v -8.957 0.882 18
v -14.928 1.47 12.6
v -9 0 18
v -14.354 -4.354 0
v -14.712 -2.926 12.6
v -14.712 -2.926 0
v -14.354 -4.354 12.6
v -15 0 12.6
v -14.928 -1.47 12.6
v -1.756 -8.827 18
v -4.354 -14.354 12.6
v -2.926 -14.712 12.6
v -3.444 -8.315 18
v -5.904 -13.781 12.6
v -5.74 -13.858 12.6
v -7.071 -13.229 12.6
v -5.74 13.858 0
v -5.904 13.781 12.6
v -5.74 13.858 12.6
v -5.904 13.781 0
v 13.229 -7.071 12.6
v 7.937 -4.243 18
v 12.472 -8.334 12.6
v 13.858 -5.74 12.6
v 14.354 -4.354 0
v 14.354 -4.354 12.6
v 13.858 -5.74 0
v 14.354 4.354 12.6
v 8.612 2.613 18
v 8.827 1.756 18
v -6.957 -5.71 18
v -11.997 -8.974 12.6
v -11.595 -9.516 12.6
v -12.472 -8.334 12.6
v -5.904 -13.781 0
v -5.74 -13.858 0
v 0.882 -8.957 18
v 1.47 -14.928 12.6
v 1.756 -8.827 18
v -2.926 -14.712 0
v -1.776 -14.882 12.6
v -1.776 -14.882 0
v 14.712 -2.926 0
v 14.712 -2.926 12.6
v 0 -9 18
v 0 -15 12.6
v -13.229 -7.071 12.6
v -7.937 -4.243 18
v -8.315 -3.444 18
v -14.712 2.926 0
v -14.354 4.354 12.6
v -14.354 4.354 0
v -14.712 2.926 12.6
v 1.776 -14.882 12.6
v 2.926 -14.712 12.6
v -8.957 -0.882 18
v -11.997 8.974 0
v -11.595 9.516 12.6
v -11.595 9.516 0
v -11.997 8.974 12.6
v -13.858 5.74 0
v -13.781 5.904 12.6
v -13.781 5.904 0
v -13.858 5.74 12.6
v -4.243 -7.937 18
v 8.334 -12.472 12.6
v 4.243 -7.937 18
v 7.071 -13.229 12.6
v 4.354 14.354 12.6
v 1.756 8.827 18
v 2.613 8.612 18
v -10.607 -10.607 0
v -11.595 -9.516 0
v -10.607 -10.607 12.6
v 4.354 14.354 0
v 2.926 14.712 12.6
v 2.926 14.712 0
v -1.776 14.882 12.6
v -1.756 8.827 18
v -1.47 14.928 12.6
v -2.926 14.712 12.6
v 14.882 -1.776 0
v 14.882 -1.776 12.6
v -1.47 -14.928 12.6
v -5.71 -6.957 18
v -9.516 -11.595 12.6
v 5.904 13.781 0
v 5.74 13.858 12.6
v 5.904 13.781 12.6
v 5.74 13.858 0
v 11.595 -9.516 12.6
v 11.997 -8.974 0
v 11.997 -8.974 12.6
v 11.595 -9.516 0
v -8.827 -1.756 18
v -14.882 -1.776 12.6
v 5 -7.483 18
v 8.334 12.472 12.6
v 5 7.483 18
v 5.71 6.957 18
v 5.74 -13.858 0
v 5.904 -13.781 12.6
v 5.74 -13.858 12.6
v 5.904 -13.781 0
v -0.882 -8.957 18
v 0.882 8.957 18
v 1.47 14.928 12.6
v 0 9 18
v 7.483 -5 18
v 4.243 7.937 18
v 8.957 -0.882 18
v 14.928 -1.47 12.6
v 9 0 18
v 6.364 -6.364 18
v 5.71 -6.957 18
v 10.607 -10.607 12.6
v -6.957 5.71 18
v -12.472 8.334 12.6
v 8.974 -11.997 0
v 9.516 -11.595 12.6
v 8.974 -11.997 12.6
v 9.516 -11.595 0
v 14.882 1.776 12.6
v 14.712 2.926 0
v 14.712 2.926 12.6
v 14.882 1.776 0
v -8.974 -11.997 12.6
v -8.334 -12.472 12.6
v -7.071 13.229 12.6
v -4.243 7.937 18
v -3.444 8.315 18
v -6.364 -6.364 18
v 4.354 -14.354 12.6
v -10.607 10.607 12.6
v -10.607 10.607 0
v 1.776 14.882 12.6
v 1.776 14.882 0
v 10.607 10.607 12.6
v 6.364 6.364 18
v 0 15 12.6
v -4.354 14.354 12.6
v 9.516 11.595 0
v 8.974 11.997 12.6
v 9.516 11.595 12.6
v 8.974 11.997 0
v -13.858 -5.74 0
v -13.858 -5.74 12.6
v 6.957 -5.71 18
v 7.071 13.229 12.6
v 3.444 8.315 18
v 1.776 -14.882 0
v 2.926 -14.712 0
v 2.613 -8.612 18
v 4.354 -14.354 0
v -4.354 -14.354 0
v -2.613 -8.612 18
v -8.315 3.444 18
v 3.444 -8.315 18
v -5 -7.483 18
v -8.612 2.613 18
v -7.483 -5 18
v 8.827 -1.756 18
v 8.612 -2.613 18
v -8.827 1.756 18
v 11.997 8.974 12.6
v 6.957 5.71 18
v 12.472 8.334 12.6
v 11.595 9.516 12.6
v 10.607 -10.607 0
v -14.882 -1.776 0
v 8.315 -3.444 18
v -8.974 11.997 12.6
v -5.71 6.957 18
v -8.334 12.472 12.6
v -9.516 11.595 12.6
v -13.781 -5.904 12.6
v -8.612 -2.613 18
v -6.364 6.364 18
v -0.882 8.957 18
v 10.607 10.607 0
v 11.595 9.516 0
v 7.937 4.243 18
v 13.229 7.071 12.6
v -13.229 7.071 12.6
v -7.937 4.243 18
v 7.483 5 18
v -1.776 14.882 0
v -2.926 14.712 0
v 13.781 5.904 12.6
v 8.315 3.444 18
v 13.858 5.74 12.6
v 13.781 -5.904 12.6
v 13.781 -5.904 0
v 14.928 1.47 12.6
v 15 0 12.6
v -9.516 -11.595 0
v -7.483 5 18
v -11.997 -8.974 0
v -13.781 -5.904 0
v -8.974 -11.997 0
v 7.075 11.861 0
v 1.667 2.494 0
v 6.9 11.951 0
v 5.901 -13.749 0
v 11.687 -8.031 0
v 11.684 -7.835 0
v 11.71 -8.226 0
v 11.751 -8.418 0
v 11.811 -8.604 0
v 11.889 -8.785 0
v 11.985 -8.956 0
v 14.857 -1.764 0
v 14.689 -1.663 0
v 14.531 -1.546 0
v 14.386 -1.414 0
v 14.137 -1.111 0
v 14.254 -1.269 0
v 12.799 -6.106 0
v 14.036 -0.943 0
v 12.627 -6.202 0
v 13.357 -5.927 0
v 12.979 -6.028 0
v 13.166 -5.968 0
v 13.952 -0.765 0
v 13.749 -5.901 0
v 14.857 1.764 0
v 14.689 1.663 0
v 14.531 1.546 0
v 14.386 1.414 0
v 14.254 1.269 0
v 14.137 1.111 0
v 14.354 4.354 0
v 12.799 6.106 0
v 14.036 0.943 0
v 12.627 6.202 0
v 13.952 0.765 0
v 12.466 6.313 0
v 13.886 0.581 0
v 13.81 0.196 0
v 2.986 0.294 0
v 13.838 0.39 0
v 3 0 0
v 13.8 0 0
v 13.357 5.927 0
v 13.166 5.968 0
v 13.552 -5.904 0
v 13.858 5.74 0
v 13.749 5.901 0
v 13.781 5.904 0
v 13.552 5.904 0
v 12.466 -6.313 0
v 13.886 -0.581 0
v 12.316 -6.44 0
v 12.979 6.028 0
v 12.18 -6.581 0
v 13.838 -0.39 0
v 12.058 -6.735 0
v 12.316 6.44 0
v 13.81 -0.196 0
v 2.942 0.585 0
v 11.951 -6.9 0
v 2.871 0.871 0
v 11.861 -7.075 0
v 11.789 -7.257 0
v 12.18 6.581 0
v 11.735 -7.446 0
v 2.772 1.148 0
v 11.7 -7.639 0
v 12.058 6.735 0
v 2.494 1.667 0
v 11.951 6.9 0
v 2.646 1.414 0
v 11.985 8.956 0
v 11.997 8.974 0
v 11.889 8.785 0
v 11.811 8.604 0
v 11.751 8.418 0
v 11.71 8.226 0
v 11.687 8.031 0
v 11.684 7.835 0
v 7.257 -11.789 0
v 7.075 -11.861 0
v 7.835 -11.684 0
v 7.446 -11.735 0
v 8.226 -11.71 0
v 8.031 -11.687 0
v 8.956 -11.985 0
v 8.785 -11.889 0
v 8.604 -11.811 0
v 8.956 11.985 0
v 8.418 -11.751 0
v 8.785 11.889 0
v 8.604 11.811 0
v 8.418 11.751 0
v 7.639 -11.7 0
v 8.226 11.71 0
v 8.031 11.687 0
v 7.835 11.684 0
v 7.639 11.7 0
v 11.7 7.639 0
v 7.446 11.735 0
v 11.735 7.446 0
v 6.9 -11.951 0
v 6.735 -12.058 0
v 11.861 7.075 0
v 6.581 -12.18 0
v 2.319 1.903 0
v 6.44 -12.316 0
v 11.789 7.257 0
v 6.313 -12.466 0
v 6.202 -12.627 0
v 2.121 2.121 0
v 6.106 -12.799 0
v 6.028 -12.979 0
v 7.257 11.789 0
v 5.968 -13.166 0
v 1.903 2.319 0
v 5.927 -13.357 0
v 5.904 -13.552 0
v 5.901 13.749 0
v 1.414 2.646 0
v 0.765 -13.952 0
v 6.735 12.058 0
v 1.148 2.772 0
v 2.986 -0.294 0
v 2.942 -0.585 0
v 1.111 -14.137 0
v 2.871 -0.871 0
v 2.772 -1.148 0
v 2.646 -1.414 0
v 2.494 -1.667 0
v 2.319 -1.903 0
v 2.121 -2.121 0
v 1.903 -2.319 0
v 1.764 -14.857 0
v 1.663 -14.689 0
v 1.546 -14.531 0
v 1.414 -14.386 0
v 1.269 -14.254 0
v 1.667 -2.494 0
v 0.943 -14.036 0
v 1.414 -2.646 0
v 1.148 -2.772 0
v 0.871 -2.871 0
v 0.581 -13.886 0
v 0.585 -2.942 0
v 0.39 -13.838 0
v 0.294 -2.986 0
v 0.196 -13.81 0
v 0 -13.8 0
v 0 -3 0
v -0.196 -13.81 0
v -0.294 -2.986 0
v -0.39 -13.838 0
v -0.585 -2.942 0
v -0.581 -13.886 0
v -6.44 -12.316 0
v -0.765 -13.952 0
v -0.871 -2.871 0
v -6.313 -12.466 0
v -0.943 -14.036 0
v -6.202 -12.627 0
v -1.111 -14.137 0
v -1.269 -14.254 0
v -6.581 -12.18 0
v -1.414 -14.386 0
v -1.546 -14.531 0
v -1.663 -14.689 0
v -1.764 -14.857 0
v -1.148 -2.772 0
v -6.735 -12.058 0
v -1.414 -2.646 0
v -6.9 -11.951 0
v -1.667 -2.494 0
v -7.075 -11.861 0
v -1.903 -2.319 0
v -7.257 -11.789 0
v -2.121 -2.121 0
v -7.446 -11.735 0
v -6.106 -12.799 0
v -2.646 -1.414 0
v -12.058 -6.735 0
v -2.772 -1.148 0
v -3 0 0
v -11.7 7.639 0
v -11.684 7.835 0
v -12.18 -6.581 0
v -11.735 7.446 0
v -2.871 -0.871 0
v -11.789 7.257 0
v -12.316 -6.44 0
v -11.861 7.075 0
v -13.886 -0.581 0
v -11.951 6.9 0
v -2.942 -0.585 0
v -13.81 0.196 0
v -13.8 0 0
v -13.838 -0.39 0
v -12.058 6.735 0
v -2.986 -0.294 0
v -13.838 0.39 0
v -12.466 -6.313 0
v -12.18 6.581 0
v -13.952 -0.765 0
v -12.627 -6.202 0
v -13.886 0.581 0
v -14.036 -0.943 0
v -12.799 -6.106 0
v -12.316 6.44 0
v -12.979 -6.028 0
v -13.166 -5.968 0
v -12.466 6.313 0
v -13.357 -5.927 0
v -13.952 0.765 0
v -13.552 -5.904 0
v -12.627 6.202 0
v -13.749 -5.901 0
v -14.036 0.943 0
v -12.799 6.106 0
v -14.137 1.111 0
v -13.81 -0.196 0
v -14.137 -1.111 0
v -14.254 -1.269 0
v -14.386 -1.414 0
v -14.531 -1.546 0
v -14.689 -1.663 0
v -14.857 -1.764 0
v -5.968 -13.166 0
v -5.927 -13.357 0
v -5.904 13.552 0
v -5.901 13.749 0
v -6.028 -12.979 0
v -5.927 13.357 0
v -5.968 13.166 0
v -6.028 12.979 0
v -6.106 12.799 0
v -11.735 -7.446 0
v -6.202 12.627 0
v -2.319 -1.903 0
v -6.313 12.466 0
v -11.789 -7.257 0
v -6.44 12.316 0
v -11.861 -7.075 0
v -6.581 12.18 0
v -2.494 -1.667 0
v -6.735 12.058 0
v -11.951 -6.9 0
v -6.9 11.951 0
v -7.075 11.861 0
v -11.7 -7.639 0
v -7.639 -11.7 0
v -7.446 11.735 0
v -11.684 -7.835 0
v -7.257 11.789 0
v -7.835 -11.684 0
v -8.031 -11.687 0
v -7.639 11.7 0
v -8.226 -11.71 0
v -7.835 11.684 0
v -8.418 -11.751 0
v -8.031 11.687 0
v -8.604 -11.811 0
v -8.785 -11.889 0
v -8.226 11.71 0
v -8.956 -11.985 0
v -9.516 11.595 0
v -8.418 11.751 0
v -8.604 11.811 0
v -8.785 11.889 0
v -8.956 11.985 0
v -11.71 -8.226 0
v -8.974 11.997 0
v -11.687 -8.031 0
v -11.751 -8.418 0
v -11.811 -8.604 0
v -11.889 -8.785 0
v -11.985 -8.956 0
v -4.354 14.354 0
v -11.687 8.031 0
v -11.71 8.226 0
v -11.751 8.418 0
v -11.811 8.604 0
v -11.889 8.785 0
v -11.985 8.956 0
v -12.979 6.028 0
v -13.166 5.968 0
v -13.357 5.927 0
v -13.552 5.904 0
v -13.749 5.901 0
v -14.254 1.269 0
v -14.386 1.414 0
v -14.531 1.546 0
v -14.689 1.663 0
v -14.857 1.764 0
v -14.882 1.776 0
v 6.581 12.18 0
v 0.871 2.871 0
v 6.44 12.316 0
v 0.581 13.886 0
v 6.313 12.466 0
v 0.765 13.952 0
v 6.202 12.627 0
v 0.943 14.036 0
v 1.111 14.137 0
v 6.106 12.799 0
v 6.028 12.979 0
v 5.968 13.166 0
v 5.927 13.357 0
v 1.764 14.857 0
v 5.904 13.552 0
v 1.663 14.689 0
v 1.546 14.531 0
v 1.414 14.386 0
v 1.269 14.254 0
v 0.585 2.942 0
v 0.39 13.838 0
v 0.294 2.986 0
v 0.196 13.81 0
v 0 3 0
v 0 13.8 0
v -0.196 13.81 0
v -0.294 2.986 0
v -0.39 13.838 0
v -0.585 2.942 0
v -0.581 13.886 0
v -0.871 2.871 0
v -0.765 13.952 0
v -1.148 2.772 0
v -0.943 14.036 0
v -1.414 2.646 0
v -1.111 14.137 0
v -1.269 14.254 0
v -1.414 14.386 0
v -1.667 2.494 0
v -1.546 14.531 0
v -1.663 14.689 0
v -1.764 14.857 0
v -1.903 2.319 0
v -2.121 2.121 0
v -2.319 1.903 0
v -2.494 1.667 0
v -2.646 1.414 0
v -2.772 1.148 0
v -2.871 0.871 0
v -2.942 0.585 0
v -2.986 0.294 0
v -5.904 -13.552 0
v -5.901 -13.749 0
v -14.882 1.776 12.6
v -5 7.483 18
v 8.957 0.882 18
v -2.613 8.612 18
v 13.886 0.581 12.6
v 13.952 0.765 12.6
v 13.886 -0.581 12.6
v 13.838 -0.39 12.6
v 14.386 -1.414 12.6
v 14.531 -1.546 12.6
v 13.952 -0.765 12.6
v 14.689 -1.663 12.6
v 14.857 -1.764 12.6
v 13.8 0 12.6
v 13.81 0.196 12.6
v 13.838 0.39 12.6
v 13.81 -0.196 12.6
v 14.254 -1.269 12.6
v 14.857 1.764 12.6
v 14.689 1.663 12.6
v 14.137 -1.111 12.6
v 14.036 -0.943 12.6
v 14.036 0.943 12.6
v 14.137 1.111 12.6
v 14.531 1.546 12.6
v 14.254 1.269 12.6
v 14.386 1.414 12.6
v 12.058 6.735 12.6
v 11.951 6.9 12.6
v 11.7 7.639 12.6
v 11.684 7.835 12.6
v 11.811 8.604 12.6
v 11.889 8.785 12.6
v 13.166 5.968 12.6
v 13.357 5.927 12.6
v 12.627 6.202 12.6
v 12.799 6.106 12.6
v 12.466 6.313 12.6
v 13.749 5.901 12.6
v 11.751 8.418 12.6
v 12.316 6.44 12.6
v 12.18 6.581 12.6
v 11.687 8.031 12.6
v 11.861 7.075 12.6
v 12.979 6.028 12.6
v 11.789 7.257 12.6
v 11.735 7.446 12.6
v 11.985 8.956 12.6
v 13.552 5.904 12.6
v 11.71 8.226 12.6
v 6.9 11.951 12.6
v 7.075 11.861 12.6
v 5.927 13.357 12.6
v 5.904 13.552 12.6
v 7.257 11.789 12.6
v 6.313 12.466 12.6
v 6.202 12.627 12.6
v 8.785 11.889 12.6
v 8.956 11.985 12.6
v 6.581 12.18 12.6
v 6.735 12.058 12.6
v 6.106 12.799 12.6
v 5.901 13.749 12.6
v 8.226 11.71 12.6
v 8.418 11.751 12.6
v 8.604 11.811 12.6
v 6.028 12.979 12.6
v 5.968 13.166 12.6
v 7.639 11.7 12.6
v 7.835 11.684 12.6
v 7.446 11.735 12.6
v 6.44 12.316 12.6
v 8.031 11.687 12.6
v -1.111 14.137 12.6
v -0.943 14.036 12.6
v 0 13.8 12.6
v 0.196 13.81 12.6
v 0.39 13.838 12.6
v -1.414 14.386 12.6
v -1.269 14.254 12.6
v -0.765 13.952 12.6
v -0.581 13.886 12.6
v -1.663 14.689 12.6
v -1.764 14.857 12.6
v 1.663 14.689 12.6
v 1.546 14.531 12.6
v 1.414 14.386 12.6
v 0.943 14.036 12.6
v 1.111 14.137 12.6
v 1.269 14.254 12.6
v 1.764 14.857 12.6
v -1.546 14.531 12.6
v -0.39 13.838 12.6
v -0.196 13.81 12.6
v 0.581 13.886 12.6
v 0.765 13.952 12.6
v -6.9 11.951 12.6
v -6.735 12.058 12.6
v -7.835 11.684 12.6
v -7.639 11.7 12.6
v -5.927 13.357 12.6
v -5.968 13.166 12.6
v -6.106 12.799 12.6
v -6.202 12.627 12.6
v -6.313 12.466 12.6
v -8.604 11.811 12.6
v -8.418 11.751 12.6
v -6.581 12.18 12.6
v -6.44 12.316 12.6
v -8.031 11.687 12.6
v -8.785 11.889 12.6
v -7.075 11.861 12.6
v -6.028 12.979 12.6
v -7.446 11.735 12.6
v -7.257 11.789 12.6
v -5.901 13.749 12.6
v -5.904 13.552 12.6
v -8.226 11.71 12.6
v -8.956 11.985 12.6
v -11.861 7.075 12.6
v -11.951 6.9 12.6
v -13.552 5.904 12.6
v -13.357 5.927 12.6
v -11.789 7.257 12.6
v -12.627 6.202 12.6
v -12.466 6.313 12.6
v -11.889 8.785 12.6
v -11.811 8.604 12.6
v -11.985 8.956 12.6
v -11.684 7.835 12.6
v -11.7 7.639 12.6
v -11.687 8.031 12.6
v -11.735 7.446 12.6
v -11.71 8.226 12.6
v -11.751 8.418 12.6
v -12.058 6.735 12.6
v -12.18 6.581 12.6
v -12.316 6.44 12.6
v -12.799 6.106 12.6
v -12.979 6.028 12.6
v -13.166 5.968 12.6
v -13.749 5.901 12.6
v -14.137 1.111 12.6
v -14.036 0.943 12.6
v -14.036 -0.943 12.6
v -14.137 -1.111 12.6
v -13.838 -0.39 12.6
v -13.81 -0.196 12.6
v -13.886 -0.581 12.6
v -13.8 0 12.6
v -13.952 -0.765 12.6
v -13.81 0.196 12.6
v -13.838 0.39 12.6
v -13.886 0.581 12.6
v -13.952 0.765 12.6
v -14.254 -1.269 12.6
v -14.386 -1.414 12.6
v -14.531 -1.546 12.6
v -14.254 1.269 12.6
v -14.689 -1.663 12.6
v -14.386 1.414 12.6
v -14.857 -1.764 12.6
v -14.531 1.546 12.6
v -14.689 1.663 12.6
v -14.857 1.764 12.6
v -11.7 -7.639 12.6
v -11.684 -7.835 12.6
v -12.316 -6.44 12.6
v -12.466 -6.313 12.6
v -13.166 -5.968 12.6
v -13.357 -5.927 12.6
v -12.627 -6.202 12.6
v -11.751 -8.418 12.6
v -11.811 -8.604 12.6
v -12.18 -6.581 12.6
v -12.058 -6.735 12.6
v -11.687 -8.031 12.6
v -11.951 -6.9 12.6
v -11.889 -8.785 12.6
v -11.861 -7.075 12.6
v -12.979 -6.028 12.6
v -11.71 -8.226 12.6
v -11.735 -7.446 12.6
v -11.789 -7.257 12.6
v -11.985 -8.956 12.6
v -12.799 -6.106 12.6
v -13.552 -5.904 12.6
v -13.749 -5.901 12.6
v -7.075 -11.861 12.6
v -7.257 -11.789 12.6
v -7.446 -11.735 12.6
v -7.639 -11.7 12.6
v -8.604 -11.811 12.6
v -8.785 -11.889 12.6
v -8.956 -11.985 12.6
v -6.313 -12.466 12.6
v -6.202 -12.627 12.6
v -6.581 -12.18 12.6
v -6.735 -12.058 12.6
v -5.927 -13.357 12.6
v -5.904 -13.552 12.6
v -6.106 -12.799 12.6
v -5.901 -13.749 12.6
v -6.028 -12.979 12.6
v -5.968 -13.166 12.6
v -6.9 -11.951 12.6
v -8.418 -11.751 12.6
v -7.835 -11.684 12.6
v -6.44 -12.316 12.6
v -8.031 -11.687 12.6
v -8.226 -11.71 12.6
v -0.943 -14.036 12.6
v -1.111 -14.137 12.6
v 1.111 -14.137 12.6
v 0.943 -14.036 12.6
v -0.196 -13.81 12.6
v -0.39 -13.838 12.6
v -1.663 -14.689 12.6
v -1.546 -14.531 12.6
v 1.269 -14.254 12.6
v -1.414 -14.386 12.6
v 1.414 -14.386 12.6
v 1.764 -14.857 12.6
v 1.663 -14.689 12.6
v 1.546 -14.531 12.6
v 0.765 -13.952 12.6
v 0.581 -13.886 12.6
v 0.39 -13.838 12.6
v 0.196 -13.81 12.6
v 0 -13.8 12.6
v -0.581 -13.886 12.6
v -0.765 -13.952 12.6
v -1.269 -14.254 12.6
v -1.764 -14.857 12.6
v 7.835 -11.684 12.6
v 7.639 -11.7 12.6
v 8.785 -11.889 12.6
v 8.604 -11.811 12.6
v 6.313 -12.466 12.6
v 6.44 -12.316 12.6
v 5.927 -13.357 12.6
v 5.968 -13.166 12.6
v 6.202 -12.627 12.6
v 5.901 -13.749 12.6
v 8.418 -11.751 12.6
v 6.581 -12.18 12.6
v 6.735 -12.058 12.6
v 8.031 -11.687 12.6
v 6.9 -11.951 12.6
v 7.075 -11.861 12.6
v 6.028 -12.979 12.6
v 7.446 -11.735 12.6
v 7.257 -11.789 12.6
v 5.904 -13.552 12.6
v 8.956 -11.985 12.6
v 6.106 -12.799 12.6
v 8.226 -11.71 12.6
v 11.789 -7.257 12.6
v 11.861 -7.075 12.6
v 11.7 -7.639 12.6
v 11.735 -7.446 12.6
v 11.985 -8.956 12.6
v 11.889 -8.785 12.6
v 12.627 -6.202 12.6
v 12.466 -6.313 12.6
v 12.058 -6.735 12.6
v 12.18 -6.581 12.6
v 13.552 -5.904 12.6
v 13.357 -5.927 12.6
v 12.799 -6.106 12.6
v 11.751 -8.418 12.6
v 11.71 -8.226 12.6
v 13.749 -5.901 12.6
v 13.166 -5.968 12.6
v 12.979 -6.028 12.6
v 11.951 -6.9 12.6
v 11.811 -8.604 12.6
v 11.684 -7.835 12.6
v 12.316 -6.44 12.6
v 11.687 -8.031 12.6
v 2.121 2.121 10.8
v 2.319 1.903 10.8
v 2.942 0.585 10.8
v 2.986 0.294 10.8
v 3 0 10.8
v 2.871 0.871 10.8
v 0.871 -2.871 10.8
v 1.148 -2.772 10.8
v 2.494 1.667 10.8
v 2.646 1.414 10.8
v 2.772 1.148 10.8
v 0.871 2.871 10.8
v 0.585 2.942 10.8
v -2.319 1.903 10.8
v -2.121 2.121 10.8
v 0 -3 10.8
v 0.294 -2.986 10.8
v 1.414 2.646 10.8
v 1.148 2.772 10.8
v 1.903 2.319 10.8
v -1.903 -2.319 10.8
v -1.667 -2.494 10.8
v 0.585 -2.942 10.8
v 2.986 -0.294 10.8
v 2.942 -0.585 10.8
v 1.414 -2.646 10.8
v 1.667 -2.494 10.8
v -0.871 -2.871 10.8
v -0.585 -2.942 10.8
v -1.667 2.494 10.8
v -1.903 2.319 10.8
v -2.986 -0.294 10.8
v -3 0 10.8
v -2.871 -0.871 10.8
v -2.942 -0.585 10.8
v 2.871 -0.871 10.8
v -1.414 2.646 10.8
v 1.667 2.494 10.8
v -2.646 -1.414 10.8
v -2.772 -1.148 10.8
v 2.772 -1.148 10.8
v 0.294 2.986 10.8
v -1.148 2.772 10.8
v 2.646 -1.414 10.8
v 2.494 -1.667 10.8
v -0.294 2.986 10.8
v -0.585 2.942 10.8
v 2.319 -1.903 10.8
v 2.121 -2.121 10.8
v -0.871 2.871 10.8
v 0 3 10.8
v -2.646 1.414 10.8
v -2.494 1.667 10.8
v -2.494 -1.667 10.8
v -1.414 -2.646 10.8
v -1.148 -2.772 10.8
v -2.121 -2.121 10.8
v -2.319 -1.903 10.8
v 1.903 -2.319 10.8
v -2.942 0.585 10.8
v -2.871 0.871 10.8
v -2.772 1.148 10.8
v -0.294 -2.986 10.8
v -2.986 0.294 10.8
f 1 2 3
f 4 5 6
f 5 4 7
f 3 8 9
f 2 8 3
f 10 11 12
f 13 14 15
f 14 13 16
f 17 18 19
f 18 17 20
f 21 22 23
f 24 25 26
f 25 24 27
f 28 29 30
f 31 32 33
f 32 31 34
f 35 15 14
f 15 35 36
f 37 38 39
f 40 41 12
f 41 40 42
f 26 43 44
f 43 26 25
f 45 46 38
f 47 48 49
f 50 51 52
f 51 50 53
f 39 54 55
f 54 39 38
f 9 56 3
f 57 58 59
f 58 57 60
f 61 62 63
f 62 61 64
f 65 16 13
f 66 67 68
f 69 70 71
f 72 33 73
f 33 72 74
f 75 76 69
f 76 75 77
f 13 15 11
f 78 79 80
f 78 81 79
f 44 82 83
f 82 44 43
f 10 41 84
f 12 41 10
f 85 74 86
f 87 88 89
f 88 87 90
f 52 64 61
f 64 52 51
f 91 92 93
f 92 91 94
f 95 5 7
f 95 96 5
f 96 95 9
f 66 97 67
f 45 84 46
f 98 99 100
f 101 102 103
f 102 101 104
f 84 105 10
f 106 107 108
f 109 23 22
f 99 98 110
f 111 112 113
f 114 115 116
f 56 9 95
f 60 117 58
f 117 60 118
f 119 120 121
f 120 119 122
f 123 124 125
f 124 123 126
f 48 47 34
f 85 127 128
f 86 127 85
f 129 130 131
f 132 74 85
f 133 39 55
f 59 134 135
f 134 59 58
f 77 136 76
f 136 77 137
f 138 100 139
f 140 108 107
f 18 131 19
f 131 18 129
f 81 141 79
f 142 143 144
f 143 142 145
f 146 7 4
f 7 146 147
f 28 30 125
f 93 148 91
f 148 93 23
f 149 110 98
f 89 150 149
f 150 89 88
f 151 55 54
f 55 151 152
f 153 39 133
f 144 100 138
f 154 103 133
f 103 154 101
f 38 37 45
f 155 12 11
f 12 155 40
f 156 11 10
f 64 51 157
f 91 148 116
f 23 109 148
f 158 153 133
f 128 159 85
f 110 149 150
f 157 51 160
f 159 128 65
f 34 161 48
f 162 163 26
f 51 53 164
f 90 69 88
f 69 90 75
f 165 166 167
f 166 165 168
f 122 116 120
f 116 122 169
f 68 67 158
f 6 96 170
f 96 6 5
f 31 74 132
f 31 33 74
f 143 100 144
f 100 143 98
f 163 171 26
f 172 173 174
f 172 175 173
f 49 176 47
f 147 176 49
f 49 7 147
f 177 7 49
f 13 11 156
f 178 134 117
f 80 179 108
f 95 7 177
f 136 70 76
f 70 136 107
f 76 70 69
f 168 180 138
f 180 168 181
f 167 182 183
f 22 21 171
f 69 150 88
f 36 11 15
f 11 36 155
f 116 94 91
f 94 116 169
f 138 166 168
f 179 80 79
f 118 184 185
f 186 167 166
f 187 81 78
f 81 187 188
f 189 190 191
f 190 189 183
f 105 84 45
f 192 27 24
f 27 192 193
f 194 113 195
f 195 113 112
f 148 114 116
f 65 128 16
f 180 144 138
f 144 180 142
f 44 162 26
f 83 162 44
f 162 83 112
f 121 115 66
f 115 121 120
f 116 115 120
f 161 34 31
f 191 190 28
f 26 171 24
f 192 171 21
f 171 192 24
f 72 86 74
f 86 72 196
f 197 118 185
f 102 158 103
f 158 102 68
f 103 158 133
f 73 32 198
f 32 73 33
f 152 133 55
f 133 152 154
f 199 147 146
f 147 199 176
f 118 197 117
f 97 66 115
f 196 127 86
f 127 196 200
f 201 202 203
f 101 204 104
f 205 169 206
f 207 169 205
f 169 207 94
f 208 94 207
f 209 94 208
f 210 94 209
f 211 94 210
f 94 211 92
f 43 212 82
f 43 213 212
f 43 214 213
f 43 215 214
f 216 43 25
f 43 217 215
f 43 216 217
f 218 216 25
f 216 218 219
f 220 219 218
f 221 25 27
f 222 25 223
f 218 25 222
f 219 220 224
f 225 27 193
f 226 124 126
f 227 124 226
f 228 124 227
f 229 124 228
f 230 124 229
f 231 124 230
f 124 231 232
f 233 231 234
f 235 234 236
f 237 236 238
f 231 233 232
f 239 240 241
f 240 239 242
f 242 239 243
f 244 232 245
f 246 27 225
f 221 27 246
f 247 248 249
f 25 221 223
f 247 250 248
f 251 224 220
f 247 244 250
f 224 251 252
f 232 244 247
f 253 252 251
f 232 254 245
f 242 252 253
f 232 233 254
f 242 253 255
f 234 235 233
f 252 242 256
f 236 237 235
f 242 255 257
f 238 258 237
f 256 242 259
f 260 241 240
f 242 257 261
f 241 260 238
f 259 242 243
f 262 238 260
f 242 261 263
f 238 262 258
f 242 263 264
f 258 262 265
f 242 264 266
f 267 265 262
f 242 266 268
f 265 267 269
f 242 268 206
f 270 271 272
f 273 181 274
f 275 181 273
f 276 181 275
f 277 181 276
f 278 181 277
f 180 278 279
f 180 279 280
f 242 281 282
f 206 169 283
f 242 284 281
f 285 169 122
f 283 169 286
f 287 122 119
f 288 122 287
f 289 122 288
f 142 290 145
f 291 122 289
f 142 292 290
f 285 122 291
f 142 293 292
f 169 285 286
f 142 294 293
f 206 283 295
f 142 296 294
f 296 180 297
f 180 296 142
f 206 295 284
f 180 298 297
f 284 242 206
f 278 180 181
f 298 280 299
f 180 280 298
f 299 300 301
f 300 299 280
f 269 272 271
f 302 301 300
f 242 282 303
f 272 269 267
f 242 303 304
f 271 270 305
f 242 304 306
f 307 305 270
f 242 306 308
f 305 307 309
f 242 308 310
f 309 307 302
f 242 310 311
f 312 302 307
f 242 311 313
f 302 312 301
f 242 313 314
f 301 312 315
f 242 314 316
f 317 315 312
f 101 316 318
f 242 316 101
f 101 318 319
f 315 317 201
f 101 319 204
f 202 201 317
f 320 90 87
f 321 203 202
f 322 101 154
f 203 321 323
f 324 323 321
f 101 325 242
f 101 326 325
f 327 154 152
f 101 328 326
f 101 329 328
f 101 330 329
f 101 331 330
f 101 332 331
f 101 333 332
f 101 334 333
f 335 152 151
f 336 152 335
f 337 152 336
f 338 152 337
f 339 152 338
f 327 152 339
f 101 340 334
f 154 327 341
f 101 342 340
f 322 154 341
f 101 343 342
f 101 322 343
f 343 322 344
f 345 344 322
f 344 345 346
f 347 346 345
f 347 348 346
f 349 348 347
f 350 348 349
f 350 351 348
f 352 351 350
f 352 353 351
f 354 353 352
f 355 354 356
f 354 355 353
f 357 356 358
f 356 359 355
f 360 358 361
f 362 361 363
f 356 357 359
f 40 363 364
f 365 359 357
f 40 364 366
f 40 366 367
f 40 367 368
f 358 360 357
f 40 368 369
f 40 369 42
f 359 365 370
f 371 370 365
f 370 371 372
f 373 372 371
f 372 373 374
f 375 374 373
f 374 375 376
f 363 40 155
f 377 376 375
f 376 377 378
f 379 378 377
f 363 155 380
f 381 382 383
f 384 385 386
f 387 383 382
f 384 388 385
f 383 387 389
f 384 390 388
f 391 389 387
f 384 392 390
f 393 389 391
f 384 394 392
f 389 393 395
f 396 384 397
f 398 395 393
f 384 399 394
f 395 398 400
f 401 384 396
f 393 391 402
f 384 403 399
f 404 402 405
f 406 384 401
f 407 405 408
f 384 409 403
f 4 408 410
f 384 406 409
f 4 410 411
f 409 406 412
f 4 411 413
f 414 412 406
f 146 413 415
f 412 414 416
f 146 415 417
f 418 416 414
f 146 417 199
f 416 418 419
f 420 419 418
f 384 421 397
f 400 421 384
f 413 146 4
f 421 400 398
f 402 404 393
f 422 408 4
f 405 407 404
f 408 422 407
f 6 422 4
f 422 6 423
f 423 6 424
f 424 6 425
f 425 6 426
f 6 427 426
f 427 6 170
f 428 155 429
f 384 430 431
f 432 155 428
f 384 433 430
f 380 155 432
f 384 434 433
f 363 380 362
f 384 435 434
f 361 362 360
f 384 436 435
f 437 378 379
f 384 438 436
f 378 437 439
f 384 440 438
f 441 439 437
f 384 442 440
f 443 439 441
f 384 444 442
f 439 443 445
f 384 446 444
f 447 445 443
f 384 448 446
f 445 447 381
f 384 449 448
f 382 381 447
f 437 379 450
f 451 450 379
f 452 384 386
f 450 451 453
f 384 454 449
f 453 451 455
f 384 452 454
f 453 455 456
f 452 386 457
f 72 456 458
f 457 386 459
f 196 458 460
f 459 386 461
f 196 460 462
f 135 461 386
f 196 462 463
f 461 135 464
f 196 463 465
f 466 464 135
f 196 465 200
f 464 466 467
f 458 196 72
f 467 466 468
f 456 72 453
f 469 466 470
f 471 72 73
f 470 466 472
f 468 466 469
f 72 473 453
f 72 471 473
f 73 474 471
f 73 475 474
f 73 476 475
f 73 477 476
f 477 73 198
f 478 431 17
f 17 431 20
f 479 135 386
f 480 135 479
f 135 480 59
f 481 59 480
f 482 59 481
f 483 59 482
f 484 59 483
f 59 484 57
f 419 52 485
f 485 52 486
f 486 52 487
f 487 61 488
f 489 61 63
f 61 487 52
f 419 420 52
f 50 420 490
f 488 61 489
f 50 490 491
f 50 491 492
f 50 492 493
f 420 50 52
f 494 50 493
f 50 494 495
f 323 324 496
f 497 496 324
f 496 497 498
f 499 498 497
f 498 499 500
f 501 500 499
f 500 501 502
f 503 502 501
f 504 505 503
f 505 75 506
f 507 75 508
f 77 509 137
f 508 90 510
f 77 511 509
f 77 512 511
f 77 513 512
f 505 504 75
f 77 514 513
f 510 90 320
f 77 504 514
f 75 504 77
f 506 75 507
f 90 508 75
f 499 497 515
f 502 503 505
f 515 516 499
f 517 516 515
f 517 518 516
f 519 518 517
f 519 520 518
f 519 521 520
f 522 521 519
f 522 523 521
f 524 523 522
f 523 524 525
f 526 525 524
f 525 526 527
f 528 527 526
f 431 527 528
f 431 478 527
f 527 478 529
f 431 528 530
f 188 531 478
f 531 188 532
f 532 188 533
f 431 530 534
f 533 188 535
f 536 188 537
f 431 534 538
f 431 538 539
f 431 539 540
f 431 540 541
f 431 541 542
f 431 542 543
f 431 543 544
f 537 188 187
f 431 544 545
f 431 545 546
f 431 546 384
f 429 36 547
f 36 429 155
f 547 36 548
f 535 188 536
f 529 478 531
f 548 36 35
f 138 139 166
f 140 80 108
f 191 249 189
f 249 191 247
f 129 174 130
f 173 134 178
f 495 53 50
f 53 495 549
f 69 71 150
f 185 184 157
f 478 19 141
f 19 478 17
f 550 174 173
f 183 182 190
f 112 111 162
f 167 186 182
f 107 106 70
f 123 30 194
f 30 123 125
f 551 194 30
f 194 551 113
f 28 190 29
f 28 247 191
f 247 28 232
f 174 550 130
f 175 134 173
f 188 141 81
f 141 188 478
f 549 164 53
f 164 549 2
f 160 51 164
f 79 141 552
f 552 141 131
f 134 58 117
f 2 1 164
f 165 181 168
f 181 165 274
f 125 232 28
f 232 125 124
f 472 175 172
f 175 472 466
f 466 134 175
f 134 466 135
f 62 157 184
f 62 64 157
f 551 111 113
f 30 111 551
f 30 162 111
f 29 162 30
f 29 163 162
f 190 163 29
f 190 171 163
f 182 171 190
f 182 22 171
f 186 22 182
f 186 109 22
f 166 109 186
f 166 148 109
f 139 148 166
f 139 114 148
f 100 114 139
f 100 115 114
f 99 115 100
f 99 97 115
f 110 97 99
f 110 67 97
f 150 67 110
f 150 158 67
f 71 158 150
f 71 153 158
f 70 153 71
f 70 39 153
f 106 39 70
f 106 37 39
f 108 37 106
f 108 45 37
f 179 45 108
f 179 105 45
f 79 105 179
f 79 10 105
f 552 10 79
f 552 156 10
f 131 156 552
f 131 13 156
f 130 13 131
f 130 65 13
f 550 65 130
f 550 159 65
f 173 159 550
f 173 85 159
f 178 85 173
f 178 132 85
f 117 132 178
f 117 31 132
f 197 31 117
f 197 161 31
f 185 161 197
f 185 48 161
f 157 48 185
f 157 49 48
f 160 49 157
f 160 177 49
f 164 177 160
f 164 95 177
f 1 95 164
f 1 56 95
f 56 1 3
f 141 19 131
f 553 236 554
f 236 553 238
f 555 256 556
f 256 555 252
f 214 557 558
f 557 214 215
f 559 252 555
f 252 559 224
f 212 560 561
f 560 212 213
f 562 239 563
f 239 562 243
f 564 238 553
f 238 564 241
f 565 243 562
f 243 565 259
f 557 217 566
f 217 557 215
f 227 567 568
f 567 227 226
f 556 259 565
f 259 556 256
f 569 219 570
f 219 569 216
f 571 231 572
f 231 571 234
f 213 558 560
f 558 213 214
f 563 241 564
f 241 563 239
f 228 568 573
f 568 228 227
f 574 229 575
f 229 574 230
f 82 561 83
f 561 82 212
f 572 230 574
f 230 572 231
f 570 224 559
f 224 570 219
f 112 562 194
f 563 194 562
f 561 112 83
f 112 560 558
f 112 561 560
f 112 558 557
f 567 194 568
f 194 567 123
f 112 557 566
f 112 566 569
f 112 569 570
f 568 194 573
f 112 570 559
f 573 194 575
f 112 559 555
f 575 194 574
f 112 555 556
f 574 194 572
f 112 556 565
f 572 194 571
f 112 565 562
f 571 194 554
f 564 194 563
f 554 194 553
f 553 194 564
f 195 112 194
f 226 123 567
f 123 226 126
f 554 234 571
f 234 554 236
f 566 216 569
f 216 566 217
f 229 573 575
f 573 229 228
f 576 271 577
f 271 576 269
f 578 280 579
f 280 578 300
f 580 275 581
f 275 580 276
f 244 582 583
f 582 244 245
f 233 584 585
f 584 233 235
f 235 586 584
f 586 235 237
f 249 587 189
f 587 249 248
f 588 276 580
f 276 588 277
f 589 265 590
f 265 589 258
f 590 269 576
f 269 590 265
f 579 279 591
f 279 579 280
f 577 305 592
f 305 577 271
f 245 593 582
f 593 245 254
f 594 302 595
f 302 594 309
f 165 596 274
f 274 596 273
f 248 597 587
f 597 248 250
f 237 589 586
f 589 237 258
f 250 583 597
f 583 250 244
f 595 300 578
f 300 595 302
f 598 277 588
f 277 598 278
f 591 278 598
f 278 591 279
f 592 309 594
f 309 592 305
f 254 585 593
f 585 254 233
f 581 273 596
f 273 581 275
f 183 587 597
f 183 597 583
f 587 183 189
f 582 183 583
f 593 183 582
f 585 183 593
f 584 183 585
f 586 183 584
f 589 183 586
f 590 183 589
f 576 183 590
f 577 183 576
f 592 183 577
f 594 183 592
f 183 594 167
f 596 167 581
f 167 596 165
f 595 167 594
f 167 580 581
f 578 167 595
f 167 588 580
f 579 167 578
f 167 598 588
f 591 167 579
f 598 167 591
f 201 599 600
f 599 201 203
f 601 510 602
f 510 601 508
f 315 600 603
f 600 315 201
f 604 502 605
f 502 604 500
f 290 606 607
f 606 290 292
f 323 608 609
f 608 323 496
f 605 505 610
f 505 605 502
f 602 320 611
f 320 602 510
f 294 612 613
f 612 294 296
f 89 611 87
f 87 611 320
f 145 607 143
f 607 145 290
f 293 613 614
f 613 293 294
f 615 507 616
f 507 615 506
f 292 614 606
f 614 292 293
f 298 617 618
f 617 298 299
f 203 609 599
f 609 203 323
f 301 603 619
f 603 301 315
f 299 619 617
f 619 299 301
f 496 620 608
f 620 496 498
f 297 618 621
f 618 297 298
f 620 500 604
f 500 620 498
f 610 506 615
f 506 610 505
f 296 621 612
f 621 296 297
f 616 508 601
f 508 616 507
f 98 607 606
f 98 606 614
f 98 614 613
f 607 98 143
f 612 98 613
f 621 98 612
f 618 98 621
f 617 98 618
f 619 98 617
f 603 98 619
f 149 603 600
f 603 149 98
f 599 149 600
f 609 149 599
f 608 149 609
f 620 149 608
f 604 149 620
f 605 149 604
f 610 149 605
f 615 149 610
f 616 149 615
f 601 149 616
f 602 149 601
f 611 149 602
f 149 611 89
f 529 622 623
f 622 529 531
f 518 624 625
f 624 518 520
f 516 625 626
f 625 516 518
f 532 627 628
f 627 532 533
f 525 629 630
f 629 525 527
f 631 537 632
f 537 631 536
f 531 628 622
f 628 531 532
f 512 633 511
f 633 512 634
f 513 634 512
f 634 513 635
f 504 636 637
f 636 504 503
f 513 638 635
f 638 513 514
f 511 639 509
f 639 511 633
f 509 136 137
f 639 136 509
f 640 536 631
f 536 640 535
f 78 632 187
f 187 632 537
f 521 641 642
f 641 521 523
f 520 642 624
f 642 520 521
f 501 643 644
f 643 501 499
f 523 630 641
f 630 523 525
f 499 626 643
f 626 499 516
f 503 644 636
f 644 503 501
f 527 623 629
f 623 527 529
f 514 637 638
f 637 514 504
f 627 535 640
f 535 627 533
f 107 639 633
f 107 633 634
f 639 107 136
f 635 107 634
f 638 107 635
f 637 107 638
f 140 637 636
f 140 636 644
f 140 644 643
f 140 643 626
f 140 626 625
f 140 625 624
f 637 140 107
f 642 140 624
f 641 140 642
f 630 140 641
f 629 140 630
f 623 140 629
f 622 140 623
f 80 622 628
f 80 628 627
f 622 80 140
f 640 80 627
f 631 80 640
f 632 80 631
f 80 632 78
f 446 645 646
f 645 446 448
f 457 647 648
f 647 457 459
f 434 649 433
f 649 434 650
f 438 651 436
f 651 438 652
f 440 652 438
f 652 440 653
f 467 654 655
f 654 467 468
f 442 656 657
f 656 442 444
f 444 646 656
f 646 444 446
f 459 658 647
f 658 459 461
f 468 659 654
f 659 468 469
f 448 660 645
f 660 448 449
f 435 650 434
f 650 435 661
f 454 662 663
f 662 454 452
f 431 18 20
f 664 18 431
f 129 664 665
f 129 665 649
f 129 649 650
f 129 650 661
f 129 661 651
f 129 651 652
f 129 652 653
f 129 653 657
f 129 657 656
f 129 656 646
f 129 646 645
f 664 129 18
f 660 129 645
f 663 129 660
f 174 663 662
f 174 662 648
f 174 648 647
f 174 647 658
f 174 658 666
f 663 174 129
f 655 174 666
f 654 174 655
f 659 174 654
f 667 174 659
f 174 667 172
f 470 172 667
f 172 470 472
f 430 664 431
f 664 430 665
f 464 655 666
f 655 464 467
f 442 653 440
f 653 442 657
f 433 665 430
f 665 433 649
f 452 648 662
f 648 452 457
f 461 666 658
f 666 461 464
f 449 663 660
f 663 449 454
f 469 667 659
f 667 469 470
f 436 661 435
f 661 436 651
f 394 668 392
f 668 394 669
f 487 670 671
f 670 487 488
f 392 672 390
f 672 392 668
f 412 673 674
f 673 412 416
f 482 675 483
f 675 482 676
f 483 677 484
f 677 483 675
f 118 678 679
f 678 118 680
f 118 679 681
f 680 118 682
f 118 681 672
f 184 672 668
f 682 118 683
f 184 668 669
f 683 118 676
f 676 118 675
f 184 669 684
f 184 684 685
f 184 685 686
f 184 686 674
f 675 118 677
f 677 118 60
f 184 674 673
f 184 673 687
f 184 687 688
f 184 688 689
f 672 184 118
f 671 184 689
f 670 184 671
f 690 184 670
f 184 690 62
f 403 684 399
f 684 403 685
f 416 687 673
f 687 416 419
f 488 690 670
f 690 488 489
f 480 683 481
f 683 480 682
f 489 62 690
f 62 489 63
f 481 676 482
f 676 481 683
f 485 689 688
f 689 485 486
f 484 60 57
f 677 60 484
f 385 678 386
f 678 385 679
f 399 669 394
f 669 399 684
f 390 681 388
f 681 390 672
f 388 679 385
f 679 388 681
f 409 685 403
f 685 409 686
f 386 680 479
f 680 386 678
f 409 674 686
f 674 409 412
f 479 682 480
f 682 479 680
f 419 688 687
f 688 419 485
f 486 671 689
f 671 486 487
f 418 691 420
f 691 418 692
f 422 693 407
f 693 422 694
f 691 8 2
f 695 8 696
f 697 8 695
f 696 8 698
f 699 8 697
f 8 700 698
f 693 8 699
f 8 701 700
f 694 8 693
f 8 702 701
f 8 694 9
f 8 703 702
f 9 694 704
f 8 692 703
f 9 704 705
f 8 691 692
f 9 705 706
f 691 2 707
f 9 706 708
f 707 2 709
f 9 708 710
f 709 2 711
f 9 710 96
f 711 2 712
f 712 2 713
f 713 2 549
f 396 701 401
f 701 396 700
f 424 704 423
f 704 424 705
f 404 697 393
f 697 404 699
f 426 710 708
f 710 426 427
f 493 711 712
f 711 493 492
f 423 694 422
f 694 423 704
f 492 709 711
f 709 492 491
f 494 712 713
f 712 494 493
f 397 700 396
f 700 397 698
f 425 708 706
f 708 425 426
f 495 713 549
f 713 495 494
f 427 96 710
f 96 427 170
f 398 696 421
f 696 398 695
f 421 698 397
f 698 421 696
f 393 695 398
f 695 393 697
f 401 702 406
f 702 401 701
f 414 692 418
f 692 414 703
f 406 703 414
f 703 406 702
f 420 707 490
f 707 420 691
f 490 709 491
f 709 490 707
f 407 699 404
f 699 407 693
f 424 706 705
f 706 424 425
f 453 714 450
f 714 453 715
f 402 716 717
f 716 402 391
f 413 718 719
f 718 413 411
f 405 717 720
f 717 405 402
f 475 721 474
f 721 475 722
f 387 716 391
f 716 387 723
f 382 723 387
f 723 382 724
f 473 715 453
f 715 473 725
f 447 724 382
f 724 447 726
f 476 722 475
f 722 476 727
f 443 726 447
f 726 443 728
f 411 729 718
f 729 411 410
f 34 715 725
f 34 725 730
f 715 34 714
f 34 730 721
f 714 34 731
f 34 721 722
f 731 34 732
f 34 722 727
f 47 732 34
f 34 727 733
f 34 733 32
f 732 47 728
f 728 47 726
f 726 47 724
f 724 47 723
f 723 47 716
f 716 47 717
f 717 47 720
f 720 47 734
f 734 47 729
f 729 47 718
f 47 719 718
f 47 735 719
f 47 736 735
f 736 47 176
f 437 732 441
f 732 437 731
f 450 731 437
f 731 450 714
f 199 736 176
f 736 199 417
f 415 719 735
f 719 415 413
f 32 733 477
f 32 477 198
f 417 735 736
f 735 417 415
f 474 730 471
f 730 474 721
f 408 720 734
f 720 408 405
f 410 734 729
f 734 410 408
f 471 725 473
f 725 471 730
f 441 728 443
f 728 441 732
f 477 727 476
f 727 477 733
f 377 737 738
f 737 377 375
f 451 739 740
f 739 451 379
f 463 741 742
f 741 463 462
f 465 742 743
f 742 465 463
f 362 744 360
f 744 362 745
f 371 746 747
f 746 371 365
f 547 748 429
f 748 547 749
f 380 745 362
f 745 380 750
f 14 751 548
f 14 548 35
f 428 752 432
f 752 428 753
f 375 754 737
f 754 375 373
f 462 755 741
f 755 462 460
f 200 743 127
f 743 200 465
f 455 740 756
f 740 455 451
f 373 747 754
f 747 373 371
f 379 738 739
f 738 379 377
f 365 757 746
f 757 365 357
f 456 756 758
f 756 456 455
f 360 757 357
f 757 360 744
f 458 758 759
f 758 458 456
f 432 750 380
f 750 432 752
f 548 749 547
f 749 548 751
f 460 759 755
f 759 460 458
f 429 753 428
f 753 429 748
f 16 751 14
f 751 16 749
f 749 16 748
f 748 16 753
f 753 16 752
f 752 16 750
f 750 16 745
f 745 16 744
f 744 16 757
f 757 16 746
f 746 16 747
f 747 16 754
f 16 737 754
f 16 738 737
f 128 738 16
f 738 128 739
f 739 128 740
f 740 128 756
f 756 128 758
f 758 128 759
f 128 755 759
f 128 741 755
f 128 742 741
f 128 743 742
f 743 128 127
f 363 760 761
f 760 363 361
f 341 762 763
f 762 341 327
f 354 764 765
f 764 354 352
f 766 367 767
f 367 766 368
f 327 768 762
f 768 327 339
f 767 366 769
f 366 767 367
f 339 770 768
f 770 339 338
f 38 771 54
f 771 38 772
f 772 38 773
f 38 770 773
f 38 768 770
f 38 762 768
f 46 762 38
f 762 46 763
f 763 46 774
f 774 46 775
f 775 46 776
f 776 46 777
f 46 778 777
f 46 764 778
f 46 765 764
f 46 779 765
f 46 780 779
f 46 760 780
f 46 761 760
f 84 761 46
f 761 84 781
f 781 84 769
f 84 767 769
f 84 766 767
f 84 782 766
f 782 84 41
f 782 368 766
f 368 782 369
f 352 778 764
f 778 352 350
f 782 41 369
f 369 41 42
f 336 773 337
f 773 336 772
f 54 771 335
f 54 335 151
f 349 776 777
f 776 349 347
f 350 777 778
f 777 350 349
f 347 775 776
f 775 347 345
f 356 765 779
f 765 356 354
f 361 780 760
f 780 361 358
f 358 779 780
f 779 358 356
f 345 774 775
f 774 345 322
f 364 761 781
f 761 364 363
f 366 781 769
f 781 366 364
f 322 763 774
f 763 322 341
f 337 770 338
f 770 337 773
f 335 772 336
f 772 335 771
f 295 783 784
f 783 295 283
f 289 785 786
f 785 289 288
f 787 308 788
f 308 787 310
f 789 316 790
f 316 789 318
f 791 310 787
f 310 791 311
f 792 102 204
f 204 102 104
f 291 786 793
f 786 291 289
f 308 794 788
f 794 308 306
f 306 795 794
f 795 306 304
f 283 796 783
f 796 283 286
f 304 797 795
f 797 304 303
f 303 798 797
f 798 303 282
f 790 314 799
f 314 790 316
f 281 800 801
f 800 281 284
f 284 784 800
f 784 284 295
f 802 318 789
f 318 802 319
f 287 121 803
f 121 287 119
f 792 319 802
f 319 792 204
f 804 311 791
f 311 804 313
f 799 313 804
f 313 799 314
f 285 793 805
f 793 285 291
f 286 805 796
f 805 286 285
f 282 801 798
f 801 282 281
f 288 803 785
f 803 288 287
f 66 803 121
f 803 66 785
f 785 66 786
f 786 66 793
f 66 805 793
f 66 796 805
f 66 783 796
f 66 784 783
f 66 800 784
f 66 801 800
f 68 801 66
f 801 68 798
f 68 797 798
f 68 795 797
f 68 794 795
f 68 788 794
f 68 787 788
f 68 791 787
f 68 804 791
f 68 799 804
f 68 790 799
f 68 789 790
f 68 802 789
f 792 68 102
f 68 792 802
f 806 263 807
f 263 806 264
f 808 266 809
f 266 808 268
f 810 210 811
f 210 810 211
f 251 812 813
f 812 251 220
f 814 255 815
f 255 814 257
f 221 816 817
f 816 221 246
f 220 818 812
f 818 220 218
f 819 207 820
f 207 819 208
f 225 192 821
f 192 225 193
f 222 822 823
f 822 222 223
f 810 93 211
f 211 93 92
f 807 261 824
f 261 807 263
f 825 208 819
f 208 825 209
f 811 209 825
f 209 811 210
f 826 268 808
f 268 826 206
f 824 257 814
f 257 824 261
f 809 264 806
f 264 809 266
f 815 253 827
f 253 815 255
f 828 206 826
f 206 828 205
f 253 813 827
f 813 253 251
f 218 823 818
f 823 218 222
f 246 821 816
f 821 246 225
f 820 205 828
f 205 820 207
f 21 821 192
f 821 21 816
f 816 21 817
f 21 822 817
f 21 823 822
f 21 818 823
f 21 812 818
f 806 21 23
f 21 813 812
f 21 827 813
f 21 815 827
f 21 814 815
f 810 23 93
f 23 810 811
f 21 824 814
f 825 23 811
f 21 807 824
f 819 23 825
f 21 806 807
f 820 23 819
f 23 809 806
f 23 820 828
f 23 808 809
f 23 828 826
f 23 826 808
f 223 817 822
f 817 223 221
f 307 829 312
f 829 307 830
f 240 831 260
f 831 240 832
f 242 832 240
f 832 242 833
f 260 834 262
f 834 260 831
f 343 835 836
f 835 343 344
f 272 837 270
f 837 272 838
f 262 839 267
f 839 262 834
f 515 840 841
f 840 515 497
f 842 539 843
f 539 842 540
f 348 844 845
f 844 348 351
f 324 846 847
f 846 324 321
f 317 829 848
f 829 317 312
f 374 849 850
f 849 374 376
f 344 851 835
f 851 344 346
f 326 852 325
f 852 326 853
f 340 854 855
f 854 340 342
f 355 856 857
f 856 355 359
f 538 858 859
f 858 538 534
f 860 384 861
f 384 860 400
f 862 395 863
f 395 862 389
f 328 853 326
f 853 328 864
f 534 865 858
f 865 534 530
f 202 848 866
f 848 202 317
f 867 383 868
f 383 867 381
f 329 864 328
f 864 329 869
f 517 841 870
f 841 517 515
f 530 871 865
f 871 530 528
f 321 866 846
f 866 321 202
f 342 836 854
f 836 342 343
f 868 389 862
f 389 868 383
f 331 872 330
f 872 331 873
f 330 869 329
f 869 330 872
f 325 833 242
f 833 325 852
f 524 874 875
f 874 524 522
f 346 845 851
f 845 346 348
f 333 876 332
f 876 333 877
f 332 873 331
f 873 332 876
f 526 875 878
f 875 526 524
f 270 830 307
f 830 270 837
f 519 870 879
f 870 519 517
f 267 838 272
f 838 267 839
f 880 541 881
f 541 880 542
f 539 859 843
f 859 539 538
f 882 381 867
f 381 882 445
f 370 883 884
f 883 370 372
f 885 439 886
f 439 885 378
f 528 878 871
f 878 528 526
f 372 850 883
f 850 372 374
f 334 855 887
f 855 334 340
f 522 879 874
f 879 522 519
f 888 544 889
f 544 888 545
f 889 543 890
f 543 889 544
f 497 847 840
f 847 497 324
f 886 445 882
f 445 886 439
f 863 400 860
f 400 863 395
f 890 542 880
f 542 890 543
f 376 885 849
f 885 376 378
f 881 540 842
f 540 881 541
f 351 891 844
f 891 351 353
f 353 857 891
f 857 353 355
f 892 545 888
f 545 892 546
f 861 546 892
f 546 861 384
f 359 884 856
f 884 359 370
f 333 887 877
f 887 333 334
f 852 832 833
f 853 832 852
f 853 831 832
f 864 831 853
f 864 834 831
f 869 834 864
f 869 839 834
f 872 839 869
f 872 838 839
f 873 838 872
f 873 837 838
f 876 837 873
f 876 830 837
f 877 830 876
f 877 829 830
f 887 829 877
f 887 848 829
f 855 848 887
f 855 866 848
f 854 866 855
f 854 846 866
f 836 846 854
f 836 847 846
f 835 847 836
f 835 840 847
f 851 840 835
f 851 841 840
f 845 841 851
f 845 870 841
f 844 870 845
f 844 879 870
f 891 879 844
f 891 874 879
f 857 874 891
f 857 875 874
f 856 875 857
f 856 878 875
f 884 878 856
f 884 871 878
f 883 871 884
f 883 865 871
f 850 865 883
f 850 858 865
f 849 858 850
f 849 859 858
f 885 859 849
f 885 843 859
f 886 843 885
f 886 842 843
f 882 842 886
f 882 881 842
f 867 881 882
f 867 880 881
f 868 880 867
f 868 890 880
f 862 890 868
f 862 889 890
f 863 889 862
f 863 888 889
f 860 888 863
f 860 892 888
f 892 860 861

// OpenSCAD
// knob: generated by ShapeBridge (https://github.com/gazi-faysal-jubayer/shapebridge)
// Units: mm. Edit the parameters below; geometry updates from them.

$fn = 64;

r = 15;
h = 18;
grip = 2;
shaft_d = 6;


difference() {
  difference() {
    difference() {
      multmatrix([[1, 0, 0, 0], [0, 1, 0, 0], [0, 0, 1, 0], [0, 0, 0, 1]]) rotate_extrude(angle = 360) polygon([[0, 0], [r, 0], [r, h * 0.7], [r * 0.6, h], [0, h]]); // body
      multmatrix([[1, 0, 0, 0], [0, 1, 0, 0], [0, 0, 1, 0], [0, 0, 0, 1]]) translate([0, 0, min(0, h * 0.7)]) linear_extrude(height = abs(h * 0.7)) translate([r + grip * 0.4, 0]) circle(r = grip); // flute
    }
    for (i = [1 : 12 - 1]) translate([0, 0, 0]) rotate([0, 0, 360 * i / 12]) translate([-(0), -(0), 0]) multmatrix([[1, 0, 0, 0], [0, 1, 0, 0], [0, 0, 1, 0], [0, 0, 0, 1]]) translate([0, 0, min(0, h * 0.7)]) linear_extrude(height = abs(h * 0.7)) translate([r + grip * 0.4, 0]) circle(r = grip); // flutes
  }
  multmatrix([[1, 0, 0, 0], [0, 1, 0, 0], [0, 0, 1, h * 0.6], [0, 0, 0, 1]]) { translate([0, 0, 0]) { translate([0, 0, -(h * 0.6)]) cylinder(r = shaft_d / 2, h = h * 0.6 + 0.0001); } } // shaft
}
